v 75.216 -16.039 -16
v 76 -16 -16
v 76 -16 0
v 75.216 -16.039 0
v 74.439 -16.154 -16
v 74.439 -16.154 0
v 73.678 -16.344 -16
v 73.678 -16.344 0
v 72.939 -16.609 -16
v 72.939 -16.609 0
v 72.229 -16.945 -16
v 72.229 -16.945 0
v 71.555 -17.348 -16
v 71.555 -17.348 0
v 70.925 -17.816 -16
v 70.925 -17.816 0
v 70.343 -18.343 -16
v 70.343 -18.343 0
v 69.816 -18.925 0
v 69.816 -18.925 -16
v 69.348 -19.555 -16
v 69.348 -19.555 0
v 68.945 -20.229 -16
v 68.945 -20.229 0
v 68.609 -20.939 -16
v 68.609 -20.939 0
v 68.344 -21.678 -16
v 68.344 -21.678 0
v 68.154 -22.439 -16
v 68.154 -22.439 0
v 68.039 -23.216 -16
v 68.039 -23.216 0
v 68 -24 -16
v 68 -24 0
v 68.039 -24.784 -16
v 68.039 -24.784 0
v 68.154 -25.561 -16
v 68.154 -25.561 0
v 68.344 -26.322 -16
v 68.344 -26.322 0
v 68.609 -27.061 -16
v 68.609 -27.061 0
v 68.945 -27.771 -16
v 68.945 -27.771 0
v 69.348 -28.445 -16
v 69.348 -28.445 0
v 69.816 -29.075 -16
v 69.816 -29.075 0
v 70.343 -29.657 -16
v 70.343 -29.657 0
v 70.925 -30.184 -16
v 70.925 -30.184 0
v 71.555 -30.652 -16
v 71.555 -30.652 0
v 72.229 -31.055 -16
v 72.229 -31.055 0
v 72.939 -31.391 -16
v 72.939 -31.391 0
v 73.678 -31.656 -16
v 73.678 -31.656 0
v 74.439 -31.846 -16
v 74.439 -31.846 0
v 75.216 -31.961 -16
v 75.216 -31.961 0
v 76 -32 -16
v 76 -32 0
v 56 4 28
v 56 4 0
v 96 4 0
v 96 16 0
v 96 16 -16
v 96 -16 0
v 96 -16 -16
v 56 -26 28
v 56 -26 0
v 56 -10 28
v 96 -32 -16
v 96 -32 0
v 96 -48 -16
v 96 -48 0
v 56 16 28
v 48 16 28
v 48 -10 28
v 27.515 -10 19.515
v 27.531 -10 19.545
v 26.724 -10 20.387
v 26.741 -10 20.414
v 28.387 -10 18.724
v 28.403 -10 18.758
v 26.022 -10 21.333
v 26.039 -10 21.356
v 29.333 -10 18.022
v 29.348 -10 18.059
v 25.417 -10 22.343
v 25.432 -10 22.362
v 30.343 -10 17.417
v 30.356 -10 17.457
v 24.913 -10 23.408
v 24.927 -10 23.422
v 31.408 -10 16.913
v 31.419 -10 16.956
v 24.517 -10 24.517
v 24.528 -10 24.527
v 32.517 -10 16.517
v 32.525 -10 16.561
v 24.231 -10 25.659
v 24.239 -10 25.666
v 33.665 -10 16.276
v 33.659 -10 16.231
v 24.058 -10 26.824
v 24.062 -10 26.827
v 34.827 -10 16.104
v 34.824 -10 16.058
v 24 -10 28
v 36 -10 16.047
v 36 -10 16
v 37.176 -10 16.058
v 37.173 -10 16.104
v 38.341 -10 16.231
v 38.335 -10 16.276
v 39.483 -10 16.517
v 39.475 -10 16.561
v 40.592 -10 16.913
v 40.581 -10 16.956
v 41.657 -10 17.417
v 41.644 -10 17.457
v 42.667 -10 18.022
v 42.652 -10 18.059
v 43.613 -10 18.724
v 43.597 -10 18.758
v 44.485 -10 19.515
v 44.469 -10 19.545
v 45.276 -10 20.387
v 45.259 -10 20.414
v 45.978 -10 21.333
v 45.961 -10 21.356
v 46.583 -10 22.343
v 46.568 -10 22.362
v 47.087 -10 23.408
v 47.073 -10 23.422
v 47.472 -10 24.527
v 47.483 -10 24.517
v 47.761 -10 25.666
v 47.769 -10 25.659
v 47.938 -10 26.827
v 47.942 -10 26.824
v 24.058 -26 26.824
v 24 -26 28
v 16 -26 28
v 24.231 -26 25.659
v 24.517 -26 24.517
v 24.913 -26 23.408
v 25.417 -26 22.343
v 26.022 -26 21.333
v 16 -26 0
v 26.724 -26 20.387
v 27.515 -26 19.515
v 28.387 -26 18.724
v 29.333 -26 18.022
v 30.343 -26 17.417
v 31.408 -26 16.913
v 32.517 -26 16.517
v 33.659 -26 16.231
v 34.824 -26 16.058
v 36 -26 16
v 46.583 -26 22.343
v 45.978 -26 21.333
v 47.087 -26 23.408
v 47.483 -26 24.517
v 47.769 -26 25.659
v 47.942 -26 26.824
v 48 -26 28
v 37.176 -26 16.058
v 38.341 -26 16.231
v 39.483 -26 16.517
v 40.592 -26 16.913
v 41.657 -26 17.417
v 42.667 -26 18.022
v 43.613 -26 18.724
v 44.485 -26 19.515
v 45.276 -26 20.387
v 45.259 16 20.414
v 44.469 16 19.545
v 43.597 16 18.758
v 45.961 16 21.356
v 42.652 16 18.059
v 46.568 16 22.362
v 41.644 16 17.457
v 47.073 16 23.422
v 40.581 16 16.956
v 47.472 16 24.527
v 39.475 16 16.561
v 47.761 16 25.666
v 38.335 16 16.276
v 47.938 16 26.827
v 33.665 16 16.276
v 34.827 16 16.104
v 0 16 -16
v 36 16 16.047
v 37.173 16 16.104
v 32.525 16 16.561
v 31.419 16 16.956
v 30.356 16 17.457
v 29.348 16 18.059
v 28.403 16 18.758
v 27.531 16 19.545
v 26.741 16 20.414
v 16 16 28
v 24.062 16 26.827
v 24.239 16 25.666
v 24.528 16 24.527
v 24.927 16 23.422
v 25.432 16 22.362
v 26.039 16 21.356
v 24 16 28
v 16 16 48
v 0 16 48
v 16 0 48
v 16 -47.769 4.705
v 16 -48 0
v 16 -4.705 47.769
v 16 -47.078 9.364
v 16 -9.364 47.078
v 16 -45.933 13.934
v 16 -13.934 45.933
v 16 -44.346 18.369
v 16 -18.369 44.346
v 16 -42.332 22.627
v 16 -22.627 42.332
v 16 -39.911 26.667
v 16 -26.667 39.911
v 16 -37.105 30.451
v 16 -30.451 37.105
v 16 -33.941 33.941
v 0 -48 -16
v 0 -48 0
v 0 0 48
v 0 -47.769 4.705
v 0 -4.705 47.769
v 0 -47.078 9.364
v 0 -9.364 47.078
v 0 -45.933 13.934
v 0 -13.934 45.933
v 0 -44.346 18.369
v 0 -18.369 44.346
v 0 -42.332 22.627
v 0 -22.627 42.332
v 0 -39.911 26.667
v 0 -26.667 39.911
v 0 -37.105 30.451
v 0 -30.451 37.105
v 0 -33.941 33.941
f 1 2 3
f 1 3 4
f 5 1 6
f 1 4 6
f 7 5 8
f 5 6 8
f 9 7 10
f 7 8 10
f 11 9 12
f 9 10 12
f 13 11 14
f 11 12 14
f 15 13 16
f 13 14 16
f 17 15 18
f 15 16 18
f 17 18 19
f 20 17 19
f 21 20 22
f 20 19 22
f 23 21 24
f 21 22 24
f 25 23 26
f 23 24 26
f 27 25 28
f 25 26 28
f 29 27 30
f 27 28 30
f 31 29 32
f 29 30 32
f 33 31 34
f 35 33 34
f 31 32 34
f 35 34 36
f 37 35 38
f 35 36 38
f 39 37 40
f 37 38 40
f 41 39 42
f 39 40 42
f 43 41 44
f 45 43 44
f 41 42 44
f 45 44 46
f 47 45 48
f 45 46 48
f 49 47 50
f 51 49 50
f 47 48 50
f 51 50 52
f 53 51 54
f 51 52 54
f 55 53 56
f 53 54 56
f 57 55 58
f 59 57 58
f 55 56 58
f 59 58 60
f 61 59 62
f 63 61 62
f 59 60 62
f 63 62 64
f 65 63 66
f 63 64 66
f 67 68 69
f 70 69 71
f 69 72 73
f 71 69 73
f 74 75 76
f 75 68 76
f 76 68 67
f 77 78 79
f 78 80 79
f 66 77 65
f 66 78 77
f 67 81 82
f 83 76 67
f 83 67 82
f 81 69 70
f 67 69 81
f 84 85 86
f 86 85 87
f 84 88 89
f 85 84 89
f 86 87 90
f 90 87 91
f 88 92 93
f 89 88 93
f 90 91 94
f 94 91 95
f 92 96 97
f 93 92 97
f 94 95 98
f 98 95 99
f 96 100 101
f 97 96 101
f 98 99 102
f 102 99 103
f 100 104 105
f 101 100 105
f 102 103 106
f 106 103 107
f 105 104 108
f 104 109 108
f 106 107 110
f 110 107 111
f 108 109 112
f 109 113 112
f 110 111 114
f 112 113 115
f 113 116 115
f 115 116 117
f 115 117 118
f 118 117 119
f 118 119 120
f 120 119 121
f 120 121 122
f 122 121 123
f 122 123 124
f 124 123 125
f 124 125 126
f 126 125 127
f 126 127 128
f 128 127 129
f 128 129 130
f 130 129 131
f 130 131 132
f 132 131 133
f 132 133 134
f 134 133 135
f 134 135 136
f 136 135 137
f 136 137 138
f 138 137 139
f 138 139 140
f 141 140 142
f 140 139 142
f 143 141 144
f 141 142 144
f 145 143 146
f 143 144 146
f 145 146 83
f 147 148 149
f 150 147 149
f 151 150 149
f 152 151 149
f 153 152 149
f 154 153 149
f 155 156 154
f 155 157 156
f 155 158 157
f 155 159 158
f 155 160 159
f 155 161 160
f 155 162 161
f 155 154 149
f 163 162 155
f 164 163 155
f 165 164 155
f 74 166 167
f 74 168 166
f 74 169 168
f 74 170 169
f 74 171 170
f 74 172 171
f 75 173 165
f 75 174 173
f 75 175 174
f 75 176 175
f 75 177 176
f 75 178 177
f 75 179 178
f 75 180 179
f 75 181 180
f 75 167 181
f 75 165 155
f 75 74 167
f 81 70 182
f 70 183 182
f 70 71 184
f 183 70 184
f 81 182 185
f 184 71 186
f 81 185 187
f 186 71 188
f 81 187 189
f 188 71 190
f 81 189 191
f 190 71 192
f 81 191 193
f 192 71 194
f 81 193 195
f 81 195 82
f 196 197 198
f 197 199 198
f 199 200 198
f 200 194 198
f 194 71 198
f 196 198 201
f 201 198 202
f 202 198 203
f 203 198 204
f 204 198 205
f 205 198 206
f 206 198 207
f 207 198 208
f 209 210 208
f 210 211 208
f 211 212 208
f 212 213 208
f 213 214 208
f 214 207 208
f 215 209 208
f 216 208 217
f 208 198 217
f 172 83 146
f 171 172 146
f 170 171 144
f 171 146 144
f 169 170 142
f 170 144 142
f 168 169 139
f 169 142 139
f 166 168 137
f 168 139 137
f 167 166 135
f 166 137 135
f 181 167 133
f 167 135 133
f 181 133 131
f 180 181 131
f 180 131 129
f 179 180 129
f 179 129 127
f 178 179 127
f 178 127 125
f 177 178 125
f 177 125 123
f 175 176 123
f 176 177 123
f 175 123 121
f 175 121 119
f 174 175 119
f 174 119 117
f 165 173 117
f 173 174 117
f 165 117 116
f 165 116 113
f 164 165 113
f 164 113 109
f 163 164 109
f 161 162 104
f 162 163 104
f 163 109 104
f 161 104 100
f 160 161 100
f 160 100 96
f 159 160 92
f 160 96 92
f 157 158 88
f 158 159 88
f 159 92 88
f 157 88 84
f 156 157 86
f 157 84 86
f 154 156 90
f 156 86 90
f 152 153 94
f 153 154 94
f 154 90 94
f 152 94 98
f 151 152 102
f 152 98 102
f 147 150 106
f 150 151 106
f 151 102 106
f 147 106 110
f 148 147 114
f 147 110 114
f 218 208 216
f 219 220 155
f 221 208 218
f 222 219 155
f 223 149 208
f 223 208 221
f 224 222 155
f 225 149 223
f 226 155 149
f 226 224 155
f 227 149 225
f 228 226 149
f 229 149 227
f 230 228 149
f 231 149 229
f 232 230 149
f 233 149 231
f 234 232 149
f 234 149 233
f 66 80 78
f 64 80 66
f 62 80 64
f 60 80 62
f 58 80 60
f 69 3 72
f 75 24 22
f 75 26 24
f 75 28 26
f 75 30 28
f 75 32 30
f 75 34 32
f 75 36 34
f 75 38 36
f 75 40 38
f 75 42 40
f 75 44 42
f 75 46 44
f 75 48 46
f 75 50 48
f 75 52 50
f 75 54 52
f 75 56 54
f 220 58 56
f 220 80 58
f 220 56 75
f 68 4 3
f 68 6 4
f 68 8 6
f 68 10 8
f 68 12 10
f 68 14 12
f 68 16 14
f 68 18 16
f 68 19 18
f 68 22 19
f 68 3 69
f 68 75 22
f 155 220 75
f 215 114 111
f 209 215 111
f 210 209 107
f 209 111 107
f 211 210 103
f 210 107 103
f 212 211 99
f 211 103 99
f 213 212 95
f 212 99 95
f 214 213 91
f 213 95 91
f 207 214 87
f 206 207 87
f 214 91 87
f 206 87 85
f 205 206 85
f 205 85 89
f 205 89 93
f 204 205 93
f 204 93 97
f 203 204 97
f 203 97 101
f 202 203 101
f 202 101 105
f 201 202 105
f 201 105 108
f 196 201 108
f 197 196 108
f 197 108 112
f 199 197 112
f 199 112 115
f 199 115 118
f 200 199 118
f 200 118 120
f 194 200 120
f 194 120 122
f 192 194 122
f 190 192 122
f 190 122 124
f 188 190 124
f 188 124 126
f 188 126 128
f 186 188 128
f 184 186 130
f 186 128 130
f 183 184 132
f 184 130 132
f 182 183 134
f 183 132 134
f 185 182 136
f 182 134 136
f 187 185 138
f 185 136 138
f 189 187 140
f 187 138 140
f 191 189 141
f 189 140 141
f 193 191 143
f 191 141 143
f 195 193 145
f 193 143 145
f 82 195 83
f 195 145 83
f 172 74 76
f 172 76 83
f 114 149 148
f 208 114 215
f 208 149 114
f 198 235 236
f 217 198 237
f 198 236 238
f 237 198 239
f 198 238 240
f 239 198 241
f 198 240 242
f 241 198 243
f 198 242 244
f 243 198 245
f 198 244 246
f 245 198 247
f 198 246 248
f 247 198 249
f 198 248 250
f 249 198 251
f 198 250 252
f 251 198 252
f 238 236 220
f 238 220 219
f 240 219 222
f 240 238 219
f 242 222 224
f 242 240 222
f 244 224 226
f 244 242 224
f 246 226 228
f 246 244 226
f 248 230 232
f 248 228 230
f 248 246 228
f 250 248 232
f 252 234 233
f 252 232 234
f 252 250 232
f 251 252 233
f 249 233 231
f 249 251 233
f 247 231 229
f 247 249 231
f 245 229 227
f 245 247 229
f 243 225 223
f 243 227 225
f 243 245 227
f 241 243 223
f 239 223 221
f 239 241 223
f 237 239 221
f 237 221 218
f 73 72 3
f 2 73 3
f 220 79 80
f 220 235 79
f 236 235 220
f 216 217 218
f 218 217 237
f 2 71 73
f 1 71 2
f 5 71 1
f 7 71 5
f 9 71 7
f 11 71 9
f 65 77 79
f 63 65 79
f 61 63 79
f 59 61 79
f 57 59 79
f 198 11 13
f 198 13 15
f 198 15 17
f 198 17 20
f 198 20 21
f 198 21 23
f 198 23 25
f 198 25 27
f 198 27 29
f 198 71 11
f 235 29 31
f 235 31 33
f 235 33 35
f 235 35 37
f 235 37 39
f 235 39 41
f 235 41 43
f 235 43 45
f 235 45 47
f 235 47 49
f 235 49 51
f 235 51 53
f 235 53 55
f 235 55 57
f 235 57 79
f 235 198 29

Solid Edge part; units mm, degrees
sketch "Sketch1" plane through (0, 0, 0) normal (1, 0, 0) x (0, 1, 0)
  arc A0 (0, 48) -> (-48, 0) centre (0, 0) ccw
  line L0 (-48, 0) -> (0, 0)
  line L1 (0, 0) -> (0, 48)
extrude "Protrusion1" add sketch "Sketch1" along normal blind 16
sketch "Sketch2" plane through (0, 0, 0) normal (1, 0, 0) x (0, 1, 0)
  line L0 (-48, -16) -> (-48, 0)
  line L1 (-48, 0) -> (0, 0)
  line L2 (0, 0) -> (0, -16)
  line L3 (0, -16) -> (-48, -16)
extrude "ExtrudedProtrusion_2" add sketch "Sketch2" along normal blind 96
sketch "Sketch3" plane through (0, 0, 0) normal (1, 0, 0) x (0, 1, 0)
  line L0 (0, 48) -> (0, 28)
  line L1 (0, 28) -> (16, 28)
  line L2 (16, 28) -> (16, 48)
  line L3 (16, 48) -> (0, 48)
extrude "Protrusion_3" add sketch "Sketch3" along normal blind 16
sketch "Sketch4" plane through (0, 0, 0) normal (1, 0, 0) x (0, 1, 0)
  line L0 (0, -16) -> (0, 28)
  line L1 (0, 28) -> (16, 28)
  line L2 (16, 28) -> (16, -16)
  line L3 (16, -16) -> (0, -16)
extrude "Protrusion_4" add sketch "Sketch4" along normal blind 96
sketch "Sketch5" plane through (56, 0, 14) normal (0, -1, 0) x (1, 0, 0)
  line L0 (0, -14) -> (0, 14)
  line L1 (0, 14) -> (40, 14)
  line L2 (40, 14) -> (40, -14)
  line L3 (40, -14) -> (0, -14)
extrude "Cutout_1" cut sketch "Sketch5" against normal blind 4
sketch "Sketch6" plane through (76, 4, 14) normal (0, -1, 0) x (1, 0, 0)
  line L0 (20, -14) -> (-20, 14)
  line L1 (-20, 14) -> (20, 14)
  line L2 (20, 14) -> (20, -14)
extrude "Cutout_2" cut sketch "Sketch6" against normal blind 12
sketch "Sketch7" plane through (36, 0, 14) normal (0, -1, 0) x (1, 0, 0)
  line L0 (-20, -14) -> (-20, 14)
  line L1 (20, -14) -> (-20, -14)
  line L2 (20, 14) -> (20, -14)
  line L3 (-20, 14) -> (20, 14)
extrude "Protrusion_5" add sketch "Sketch7" along normal blind 10
sketch "Sketch8" plane through (36, -10, 14) normal (0, -1, 0) x (1, 0, 0)
  line L0 (12, 14) -> (-12, 14)
  arc A0 (-12, 14) -> (12, 14) centre (0, 14) ccw
extrude "Cutout_3" cut sketch "Sketch8" against normal blind 26
sketch "Sketch9" plane through (56, -22, 0) normal (0, 0, 1) x (1, 0, 0)
  line L0 (40, 6) -> (20, 6)
  arc A0 (20, 6) -> (20, -10) centre (20, -2) ccw
  line L1 (40, -10) -> (20, -10)
  line L2 (40, 6) -> (40, -10)
extrude "Cutout_4" cut sketch "Sketch9" against normal blind 16
sketch "Sketch10" plane through (36, -10, 14) normal (0, -1, 0) x (1, 0, 0)
  line L0 (-20, -14) -> (-20, 13.9689)
  line L1 (-20, 13.9689) -> (-12, 14)
  arc A0 (-12, 14) -> (12, 14) centre (0, 14.0466) ccw
  line L2 (20, 14) -> (12, 14)
  line L3 (20, 14) -> (20, -14)
  line L4 (20, -14) -> (-20, -14)
extrude "Protrusion_6" add sketch "Sketch10" against normal blind 26
sketch "Sketch11" plane through (36, -10, 14) normal (0, -1, 0) x (1, 0, 0)
  line L0 (20, 14) -> (12, 14)
  line L1 (20, -14) -> (20, 14)
  line L2 (-20, -14) -> (20, -14)
  line L3 (-20, 14) -> (-20, -14)
  line L4 (-12, 14) -> (-20, 14)
  arc A0 (-12, 14) -> (12, 14) centre (0, 14) ccw
extrude "Protrusion2" add sketch "Sketch11" along normal blind 16
